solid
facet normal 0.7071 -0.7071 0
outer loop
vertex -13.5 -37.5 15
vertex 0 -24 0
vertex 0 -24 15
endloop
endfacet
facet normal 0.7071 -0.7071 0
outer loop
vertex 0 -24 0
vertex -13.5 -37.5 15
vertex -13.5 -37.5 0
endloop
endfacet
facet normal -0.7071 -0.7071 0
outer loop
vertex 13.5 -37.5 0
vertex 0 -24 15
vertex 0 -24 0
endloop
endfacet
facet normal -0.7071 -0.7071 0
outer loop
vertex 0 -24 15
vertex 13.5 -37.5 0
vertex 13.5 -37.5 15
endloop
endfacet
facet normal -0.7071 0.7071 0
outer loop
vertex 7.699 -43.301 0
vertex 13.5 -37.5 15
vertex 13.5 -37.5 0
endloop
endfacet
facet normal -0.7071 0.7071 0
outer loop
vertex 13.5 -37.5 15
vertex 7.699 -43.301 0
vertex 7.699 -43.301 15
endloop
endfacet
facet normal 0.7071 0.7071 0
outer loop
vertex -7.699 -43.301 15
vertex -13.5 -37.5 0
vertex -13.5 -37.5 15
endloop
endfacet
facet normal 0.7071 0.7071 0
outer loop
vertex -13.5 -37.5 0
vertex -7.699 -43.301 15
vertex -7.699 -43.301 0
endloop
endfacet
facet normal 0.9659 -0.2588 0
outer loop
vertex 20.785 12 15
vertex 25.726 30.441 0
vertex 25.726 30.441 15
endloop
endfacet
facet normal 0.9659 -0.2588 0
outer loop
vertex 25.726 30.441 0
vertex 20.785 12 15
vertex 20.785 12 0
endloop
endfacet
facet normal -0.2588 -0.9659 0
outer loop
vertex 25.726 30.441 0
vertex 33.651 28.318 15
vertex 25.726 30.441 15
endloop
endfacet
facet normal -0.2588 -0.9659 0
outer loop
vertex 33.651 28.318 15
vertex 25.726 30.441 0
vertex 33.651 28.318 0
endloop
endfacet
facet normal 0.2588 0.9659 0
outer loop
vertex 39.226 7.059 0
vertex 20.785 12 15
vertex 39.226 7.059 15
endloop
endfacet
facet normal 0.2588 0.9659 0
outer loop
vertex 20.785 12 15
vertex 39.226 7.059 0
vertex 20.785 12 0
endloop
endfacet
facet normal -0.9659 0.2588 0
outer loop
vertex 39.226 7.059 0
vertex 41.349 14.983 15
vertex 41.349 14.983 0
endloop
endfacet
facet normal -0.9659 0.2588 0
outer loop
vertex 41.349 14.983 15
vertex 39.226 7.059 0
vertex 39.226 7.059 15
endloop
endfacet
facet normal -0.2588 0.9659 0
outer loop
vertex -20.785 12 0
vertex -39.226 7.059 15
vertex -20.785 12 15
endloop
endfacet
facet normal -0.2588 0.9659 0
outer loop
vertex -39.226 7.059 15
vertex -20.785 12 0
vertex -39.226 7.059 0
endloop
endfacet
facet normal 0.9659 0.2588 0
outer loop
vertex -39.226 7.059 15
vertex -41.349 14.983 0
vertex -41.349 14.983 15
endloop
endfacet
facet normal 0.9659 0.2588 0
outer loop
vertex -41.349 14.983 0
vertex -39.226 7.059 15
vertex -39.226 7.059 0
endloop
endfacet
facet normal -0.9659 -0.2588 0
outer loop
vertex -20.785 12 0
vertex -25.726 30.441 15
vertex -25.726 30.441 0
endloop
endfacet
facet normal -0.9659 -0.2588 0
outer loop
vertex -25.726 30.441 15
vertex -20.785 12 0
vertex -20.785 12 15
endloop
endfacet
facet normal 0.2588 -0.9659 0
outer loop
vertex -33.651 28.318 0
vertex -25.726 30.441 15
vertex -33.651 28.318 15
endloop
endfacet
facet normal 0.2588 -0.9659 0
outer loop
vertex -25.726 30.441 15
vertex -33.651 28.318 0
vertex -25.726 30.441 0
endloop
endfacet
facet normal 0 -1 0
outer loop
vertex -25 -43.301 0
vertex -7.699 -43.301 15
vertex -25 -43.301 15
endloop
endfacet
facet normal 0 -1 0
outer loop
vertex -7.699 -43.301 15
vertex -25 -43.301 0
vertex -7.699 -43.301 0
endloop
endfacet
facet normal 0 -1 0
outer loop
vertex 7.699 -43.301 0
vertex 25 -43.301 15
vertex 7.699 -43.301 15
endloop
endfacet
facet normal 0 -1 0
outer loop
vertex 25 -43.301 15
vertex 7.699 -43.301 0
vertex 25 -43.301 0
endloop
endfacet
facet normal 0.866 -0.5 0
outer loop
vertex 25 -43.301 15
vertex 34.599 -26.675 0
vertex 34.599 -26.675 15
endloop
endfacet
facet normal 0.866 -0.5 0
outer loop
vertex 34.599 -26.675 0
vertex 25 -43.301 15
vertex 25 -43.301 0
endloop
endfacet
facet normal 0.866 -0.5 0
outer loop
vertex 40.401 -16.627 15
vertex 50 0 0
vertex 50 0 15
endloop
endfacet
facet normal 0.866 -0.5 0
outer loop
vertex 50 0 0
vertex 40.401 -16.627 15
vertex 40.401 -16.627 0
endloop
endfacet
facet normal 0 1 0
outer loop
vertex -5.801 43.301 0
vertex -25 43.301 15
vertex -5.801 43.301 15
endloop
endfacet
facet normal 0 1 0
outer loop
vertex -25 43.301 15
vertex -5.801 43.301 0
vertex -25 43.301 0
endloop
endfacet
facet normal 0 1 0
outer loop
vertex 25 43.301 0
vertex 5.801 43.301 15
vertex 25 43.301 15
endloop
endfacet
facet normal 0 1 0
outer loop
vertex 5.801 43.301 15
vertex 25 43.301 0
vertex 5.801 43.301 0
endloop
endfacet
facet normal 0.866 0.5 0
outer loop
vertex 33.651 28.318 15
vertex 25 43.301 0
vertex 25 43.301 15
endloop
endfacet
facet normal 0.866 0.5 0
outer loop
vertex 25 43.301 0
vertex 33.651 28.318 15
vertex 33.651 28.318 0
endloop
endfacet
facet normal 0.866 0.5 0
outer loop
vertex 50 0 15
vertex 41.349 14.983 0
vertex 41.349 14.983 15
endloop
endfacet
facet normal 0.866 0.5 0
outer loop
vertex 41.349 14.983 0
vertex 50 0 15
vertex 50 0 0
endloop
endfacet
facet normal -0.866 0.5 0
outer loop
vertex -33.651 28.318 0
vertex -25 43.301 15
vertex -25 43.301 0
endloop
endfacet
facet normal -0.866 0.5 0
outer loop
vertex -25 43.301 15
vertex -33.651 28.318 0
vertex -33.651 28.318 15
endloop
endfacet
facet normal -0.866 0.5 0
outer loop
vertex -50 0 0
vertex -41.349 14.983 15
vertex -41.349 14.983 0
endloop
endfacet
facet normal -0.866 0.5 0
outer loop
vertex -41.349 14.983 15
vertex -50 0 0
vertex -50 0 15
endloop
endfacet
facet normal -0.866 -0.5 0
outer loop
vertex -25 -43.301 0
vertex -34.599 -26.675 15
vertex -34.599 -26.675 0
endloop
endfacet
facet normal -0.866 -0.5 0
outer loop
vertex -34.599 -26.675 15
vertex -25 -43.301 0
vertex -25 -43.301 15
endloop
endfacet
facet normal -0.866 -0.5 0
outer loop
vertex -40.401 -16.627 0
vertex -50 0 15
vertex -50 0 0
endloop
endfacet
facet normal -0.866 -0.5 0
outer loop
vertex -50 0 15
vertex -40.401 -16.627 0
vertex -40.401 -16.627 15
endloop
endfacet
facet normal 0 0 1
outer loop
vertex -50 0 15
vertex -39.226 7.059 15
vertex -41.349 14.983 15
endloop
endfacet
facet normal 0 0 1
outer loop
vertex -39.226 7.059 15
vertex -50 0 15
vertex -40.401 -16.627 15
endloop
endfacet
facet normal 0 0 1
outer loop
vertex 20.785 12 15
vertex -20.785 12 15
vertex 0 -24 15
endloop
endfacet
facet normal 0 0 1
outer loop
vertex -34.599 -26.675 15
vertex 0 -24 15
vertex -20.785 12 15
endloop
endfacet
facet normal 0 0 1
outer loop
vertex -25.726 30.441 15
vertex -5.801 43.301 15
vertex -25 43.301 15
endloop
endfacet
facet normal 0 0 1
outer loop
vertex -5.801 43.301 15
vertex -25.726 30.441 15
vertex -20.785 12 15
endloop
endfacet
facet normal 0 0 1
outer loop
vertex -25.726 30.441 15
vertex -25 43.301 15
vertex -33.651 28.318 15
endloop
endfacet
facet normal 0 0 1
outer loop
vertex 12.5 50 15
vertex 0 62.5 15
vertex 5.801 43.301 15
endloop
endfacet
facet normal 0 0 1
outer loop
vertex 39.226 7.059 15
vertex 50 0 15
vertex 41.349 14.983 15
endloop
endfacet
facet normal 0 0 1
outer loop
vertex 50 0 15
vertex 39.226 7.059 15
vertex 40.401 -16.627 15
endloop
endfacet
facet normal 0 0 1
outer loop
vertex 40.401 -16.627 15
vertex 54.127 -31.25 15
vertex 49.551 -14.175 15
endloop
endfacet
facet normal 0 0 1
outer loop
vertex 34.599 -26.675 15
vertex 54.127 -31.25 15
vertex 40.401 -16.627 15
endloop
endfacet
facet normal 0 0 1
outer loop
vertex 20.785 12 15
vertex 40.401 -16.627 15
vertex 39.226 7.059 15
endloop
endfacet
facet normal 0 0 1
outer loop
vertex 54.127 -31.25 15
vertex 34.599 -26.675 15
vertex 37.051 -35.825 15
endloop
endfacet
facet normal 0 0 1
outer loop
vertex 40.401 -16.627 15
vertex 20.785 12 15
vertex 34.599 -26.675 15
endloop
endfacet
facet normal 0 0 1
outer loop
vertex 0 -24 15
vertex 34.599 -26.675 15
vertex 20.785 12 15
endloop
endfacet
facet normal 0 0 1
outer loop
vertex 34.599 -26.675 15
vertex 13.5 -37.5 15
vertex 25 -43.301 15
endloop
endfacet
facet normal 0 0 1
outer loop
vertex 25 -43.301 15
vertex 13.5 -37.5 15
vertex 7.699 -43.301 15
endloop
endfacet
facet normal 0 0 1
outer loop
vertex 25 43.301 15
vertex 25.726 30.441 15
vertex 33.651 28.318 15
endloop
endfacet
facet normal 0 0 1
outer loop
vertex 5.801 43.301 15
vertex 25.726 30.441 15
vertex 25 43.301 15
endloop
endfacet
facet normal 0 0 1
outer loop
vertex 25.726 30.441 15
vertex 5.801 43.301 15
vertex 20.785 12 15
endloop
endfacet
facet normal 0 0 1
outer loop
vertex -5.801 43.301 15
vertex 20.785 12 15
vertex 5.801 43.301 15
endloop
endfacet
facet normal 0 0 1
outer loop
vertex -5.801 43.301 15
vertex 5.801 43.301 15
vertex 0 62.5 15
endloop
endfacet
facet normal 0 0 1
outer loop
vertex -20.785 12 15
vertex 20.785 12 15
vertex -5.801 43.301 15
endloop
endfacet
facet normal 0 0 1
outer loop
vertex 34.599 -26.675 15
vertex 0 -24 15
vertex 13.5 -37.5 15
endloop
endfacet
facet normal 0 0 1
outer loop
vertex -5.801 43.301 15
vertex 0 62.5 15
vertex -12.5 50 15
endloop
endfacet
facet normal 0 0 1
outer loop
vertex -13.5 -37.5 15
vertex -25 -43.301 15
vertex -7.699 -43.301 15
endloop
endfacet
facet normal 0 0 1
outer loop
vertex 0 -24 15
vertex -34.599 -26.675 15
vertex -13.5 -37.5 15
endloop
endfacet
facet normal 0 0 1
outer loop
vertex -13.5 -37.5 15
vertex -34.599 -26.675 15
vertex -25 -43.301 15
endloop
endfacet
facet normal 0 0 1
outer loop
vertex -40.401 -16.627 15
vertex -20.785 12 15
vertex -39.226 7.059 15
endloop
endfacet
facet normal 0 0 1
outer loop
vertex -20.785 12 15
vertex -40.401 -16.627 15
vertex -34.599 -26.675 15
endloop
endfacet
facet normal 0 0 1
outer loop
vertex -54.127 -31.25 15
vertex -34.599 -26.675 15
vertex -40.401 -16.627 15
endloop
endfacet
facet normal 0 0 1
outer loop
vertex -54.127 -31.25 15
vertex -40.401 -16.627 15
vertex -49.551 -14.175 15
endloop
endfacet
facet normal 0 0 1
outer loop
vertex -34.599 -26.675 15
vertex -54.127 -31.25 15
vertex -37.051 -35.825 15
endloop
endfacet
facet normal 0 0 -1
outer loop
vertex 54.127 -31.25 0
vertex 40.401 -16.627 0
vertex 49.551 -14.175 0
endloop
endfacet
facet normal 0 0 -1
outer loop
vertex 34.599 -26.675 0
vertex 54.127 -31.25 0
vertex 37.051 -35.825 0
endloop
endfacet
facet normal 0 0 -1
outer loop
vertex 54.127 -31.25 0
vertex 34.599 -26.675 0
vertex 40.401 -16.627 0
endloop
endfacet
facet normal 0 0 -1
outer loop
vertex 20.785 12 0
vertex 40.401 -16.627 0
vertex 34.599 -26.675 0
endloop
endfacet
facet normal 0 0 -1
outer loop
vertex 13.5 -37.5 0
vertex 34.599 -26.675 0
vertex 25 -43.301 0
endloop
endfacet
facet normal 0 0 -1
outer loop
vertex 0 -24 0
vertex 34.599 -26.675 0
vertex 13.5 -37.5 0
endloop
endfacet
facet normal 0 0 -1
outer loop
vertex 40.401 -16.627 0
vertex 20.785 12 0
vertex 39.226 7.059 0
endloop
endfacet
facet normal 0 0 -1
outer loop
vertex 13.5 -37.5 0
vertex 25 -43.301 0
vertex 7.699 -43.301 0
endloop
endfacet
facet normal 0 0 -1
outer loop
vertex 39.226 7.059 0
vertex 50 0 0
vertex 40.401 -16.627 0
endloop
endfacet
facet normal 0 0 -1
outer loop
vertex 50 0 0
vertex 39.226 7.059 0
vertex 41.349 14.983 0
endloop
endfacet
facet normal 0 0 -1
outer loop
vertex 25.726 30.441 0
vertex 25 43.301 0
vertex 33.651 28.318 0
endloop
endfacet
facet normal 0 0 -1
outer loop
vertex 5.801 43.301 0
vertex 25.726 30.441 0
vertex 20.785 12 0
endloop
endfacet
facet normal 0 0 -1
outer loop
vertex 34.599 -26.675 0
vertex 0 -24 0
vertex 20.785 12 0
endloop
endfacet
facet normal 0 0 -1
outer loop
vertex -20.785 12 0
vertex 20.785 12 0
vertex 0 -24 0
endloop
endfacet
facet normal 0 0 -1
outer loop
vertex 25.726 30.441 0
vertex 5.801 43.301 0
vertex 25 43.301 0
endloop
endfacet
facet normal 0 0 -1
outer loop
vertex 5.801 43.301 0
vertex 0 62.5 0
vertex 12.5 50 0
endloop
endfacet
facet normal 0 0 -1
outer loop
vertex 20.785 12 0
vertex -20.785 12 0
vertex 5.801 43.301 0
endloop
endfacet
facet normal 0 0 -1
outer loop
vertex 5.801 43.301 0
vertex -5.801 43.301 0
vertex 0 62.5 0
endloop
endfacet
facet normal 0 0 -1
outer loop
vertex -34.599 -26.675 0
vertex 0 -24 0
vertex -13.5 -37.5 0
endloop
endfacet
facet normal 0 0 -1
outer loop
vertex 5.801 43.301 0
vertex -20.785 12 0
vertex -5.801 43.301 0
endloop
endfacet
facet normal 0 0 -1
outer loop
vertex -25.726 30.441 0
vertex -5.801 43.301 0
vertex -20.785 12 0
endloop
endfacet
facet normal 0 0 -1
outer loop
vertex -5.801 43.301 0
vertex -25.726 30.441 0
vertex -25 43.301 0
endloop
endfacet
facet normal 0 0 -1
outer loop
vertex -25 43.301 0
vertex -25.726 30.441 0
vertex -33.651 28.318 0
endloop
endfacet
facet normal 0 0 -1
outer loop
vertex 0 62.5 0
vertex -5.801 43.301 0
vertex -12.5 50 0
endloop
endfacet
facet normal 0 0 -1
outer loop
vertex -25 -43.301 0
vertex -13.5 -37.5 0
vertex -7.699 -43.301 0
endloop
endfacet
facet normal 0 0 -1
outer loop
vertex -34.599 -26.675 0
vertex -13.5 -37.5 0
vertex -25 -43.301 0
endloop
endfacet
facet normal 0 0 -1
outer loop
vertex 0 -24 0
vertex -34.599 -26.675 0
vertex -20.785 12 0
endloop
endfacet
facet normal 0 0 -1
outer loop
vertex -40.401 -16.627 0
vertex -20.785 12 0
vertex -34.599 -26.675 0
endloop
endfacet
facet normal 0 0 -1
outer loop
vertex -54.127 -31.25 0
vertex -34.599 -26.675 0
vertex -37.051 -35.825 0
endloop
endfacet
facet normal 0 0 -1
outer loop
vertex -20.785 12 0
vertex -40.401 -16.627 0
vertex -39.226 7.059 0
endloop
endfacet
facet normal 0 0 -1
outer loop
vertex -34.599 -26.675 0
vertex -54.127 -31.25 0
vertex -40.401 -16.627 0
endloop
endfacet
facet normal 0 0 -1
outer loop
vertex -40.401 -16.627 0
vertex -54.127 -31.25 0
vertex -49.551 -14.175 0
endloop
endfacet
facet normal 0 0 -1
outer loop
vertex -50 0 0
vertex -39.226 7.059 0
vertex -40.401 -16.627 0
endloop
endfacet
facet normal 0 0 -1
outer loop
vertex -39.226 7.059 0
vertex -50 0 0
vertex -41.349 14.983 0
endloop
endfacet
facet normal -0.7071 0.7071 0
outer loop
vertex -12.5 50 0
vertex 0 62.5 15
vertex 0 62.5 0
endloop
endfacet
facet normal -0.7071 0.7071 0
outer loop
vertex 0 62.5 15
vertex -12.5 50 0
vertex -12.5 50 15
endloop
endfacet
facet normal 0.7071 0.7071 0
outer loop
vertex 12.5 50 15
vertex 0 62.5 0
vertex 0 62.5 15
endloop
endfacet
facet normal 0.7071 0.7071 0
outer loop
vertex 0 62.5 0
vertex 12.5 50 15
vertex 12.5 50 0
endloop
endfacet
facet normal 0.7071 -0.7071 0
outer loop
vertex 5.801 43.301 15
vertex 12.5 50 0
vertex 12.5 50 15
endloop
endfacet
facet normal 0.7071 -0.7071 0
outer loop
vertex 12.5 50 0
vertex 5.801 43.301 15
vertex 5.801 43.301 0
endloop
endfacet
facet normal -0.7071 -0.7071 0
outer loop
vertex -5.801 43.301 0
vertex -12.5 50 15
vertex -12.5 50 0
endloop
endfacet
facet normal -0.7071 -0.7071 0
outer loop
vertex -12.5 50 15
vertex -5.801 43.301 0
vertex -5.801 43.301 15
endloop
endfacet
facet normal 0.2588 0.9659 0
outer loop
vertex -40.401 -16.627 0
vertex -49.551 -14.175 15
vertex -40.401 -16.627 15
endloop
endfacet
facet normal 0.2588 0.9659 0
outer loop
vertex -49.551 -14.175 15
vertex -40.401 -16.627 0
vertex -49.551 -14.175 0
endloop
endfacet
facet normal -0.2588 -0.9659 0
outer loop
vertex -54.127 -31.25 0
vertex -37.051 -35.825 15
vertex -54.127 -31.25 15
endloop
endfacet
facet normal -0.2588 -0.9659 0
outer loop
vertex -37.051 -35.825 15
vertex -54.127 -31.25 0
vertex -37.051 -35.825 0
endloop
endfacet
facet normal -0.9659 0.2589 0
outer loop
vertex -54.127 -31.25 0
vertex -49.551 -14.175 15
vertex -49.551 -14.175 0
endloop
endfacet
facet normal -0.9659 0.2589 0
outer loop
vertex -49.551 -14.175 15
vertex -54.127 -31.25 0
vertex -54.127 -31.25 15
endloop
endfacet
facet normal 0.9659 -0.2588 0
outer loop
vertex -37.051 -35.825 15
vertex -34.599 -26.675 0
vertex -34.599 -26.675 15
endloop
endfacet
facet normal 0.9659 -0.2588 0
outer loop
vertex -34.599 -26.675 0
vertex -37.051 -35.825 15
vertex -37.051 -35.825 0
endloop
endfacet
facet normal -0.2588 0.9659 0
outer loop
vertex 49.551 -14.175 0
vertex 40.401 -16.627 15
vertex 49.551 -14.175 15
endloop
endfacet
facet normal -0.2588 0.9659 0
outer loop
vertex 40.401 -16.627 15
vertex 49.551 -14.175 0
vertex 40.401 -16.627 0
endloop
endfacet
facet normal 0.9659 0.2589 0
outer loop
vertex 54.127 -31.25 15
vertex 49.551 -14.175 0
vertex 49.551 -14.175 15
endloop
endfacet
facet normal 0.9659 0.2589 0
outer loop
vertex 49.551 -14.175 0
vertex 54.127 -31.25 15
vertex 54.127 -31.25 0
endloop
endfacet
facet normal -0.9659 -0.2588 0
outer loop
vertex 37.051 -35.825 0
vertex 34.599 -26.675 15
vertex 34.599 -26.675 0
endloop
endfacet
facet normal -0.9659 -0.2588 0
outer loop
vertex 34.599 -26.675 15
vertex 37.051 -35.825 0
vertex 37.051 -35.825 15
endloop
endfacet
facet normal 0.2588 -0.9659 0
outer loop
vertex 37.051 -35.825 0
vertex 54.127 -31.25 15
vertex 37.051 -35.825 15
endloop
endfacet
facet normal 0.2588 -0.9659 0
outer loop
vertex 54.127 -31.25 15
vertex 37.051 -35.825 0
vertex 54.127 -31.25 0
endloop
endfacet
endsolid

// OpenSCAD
//Copyright Mateo Carreras 2016. All rights reserved.
//
//PokeyOne's Hexagonal Connectors

//customize these:

//height of block DEFAULT=15
height = 15; 
//space between male and female connector ends DEFAULT=1
gap = 1; 
//scale of the model DEFAULT=1
pieceScale = 1; 

piece();

module piece(){
    //Don't touch unless you know what you're doing
    //DEFAULT=3 NOTE="must be multiple of 3, and odd"
    sides = 3; 
    //Don't touch unless you know what you're doing
    //totalSides
    totalSides = sides*2;
    //Don't touch unless you know what you're doing
    //size of connectors DEFAULT=12.5
    connectorRadius = 12.5; 
    //Don't touch unless you know what you're doing
    //size of block DEFAULT=50
    pieceRadius = 50; 

    scale(pieceScale){
        difference(){
            cylinder(h=height, r=pieceRadius, center=false, $fn=totalSides);
            for(i = [0 : sides-1]) {
                rotate([0, 0, (360/sides)*i]){
                    translate([0, -1*pieceRadius+connectorRadius, 0]){
                        cylinder(h=height*2.5, r=connectorRadius+gap, center=true, $fn=4);
                    }
                }
            }
        }

        for(i = [0 : sides-1]) {
            rotate([0, 0, (360/sides)*i]){
                translate([0, pieceRadius, 0]){
                    cylinder(h=height, r=connectorRadius, center=false, $fn=4);
                }
            }
        }
    }
}
